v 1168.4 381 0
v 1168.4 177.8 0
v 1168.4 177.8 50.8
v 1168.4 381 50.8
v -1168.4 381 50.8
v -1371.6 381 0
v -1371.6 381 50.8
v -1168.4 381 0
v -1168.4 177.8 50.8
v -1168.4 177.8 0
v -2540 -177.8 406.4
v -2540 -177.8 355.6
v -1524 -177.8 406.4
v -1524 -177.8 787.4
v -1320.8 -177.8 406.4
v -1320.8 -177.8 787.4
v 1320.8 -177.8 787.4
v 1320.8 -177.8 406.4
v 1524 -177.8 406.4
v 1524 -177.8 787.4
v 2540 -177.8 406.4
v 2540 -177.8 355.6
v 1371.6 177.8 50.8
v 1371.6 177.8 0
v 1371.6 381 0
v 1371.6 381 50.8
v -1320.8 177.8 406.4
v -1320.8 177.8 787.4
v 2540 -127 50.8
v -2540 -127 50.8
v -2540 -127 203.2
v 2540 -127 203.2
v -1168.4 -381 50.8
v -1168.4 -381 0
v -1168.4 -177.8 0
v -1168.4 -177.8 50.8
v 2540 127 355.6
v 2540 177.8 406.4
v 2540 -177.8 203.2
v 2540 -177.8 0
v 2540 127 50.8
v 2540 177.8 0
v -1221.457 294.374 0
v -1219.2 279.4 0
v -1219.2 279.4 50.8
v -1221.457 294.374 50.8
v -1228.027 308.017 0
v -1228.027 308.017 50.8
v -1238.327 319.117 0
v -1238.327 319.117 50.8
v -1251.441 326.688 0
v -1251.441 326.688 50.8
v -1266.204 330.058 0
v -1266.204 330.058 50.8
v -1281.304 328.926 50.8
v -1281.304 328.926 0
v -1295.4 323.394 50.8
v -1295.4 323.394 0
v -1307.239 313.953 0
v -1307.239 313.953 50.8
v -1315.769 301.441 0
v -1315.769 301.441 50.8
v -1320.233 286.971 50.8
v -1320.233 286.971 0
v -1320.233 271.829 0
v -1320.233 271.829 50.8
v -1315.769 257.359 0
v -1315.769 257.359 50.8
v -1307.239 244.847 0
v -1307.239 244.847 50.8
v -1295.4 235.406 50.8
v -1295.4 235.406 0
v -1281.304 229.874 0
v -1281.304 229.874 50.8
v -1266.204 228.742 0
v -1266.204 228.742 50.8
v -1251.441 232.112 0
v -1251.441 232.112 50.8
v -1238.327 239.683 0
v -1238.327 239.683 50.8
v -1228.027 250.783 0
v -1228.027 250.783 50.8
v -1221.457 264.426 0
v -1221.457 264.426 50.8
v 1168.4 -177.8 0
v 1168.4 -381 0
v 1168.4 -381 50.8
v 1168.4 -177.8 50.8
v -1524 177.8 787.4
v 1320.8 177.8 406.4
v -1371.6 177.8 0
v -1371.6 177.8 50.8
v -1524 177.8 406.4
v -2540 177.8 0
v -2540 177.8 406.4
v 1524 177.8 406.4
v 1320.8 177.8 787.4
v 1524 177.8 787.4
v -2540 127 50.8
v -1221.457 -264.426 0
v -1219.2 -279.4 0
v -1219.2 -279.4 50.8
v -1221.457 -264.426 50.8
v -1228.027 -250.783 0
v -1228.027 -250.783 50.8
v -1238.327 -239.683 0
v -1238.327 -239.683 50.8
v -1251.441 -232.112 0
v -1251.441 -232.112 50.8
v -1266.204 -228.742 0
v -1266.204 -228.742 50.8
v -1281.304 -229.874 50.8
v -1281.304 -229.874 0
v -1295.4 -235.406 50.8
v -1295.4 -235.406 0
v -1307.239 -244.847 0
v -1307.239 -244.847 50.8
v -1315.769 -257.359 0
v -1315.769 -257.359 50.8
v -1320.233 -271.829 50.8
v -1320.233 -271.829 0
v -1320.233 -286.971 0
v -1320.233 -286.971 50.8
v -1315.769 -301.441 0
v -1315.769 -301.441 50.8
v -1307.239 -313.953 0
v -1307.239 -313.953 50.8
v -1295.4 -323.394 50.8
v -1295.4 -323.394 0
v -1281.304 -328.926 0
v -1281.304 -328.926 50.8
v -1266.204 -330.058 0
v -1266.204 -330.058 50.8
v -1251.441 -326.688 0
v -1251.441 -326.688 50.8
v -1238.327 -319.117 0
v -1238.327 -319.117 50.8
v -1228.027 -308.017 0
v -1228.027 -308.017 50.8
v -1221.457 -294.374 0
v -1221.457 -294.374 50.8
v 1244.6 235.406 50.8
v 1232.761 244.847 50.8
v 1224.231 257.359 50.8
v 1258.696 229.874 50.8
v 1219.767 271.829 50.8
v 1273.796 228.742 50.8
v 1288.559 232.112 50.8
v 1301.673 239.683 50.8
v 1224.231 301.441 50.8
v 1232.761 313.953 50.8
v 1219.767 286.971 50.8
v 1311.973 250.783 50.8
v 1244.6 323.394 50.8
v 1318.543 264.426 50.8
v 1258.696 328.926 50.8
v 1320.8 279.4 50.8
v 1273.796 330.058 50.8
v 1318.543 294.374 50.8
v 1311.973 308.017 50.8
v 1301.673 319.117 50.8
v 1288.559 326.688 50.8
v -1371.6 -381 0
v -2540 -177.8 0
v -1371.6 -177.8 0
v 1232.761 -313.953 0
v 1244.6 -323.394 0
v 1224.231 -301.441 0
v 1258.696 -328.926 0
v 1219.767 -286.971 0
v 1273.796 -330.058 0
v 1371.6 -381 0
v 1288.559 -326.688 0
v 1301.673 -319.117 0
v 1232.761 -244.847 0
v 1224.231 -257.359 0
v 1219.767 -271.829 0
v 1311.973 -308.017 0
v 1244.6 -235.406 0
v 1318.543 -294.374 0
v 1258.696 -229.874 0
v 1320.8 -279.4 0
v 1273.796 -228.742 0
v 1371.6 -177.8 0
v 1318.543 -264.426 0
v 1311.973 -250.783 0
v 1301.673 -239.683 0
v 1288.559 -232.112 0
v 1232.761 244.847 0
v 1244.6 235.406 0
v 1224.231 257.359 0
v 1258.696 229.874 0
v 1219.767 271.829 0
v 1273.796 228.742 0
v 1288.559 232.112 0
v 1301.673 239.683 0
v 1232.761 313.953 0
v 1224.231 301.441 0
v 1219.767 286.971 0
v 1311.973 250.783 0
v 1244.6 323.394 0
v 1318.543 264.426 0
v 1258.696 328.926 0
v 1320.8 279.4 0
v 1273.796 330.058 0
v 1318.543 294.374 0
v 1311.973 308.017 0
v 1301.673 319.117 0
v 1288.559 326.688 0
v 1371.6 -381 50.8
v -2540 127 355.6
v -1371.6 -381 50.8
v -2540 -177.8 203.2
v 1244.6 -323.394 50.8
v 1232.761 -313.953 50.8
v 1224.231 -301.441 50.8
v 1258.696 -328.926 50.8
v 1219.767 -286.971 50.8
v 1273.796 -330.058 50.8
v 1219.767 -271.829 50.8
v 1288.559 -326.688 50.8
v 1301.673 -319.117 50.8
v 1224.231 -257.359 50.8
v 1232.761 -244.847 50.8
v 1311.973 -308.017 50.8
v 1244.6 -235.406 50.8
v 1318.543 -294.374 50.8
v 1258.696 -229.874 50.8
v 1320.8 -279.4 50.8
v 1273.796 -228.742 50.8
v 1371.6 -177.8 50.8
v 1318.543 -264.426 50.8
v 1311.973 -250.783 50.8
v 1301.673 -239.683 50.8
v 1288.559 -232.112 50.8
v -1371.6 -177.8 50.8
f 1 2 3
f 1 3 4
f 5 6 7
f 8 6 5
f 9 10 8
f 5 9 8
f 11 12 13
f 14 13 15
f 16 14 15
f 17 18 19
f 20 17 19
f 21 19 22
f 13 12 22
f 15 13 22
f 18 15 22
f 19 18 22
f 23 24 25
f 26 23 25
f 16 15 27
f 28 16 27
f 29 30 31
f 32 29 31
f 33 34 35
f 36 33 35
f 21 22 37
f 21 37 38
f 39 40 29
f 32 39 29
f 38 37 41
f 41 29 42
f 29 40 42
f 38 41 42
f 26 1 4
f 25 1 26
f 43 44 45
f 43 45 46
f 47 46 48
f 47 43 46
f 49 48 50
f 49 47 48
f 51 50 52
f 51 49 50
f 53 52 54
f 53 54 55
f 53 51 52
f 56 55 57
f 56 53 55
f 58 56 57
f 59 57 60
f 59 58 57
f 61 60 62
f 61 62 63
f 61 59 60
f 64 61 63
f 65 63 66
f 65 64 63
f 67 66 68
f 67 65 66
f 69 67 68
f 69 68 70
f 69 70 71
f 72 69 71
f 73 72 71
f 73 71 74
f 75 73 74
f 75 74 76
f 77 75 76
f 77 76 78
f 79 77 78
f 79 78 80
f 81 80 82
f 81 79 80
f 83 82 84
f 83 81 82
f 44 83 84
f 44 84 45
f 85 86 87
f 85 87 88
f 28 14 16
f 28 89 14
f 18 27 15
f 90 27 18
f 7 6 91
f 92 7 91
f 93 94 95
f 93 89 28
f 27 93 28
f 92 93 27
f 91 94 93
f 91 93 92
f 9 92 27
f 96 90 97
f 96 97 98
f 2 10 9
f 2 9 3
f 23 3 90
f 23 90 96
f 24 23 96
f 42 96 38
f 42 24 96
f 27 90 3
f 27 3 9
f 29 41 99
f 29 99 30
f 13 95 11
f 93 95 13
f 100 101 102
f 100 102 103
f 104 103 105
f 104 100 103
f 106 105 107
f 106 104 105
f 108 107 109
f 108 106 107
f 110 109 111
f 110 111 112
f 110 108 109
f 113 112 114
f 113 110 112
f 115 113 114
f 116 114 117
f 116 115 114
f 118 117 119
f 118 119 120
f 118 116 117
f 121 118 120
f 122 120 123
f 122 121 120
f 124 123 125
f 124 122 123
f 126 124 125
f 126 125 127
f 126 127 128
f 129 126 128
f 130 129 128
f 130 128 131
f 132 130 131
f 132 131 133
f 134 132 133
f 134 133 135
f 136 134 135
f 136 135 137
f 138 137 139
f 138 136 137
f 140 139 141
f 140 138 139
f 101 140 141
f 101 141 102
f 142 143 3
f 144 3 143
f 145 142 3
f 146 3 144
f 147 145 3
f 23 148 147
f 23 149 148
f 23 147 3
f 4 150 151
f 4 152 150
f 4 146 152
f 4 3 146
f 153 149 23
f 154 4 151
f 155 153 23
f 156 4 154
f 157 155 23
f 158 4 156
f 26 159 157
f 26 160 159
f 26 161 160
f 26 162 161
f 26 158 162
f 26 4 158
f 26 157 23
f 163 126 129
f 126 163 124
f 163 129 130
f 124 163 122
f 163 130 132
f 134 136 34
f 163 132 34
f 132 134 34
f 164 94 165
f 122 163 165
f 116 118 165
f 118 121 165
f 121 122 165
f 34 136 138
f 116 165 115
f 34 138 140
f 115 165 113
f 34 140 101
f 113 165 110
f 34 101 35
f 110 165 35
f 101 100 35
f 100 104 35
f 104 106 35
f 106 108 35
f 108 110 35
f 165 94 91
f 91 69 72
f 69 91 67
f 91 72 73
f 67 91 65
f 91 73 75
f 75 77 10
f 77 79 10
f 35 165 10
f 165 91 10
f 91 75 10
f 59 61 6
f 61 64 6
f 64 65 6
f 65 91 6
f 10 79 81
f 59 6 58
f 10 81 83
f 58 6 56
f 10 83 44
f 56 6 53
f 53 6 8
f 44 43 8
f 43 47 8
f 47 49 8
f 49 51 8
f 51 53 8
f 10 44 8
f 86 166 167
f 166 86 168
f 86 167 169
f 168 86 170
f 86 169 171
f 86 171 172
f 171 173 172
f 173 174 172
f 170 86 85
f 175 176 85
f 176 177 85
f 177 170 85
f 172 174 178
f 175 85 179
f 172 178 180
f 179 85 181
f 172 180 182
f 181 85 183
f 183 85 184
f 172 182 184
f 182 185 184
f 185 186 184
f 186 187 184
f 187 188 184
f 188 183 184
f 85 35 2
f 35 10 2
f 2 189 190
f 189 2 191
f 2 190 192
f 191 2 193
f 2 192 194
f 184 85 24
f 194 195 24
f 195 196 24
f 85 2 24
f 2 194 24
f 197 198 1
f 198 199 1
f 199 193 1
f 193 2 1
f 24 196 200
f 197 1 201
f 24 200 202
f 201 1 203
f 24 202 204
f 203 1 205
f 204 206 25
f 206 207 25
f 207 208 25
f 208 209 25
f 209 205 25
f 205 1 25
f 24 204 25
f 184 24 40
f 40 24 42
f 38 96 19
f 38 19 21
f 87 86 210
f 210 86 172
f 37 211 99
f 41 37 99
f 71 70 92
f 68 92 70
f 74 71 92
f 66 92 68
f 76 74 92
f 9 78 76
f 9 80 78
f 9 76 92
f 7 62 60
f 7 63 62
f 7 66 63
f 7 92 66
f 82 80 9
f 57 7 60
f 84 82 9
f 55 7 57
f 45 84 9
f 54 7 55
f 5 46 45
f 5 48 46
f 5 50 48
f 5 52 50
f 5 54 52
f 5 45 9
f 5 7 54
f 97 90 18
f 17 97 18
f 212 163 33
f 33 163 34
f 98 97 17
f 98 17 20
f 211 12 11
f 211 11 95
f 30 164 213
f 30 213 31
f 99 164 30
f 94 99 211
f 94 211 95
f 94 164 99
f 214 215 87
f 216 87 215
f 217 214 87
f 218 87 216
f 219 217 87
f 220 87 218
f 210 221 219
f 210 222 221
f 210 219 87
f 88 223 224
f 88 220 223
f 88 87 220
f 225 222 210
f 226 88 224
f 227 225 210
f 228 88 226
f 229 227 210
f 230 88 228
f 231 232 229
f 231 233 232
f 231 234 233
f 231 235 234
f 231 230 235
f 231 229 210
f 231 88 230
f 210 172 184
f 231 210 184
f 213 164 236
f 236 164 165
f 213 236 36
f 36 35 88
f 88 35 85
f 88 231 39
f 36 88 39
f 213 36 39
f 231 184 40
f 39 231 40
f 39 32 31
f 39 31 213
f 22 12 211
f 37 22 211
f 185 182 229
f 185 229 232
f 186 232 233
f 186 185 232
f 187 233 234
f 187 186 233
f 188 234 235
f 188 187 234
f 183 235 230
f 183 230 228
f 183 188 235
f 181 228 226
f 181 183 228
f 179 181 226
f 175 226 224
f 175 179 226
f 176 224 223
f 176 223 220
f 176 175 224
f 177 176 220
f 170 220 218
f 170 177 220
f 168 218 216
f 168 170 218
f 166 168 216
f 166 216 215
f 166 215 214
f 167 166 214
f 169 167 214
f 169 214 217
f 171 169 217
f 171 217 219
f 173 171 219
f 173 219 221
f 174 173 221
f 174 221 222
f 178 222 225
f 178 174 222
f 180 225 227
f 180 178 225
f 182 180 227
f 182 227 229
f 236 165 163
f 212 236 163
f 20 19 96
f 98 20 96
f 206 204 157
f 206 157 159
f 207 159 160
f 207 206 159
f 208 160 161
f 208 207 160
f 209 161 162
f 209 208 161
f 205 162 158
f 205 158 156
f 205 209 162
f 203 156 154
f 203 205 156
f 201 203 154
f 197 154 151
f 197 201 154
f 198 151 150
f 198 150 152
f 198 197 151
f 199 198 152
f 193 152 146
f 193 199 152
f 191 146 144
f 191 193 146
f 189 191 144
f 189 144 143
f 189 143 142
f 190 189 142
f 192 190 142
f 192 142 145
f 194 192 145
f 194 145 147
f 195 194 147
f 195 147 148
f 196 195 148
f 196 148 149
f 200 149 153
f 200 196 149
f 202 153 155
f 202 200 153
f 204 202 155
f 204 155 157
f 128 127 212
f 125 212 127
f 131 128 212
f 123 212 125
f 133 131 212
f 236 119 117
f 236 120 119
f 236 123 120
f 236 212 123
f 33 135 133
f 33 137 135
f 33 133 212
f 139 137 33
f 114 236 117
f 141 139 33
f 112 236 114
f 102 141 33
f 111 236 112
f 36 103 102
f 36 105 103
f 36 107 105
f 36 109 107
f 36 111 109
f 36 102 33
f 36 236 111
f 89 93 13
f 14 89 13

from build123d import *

# Parameters (mm, degrees)
F0_W     = 203.2
F0_H     = 203.2
F0_R     = 50.8
F0_H_2   = 355.6
F0_W_2   = 2336.8
F0_W_3   = 1168.4
F1_DEPTH = 50.8
F2_DEPTH = 406.4
F3_W     = 50.8
F3_H     = 152.4
F4_DEPTH = 5963.92
F5_W     = 203.2
F5_H     = 177.8
F6_DEPTH = 381


with BuildPart() as f1:
    # F0 (on Top) → F1 (new body)
    with BuildSketch(Plane.XY):
        with Locations((-1270, 279.4)):
            Rectangle(F0_W, F0_H)
        with Locations((-1270, 279.4)):
            Circle(F0_R, mode=Mode.SUBTRACT)
        with Locations((-1270, -279.4)):
            Rectangle(F0_W, F0_H)
        with Locations((-1270, -279.4)):
            Circle(F0_R, mode=Mode.SUBTRACT)
        with Locations((-1270, 0)):
            Rectangle(F0_W, F0_H_2)
        Rectangle(F0_W_2, F0_H_2)
        with Locations((-1955.8, 0)):
            Rectangle(F0_W_3, F0_H_2)
        with Locations((1955.8, 0)):
            Rectangle(F0_W_3, F0_H_2)
        with Locations((1270, 0)):
            Rectangle(F0_W, F0_H_2)
        with Locations((1270, 279.4)):
            Rectangle(F0_W, F0_H)
        with Locations((1270, 279.4)):
            Circle(F0_R, mode=Mode.SUBTRACT)
        with Locations((1270, -279.4)):
            Rectangle(F0_W, F0_H)
        with Locations((1270, -279.4)):
            Circle(F0_R, mode=Mode.SUBTRACT)
    extrude(amount=F1_DEPTH)

    # F0 (on Top) → F2 (join)
    with BuildSketch(Plane.XY):
        Rectangle(F0_W_2, F0_H_2)
        with Locations((1955.8, 0)):
            Rectangle(F0_W_3, F0_H_2)
        with Locations((-1955.8, 0)):
            Rectangle(F0_W_3, F0_H_2)
        with Locations((-1270, 0)):
            Rectangle(F0_W, F0_H_2)
        with Locations((1270, 0)):
            Rectangle(F0_W, F0_H_2)
    extrude(amount=F2_DEPTH)

    # F3 (on face) → F4 (cut)
    with BuildSketch(Plane(origin=(-2540, 0, 0), x_dir=(0, -1, 0), z_dir=(-1, 0, 0))):
        Polygon((-127, 355.6), (-127, 50.8), (127, 50.8), (127, 203.2), (127, 355.6), align=None)
        with Locations((203.2, 279.4)):
            Rectangle(F3_W, F3_H)
        with Locations((152.4, 279.4)):
            Rectangle(F3_W, F3_H)
    extrude(amount=-F4_DEPTH, mode=Mode.SUBTRACT)

    # F5 (on face) → F6 (join)
    with BuildSketch(Plane.XY.offset(406.4)):
        with Locations((1422.4, 88.9)):
            Rectangle(F5_W, F5_H)
        with Locations((1422.4, -88.9)):
            Rectangle(F5_W, F5_H)
        with Locations((-1422.4, -88.9)):
            Rectangle(F5_W, F5_H)
        with Locations((-1422.4, 88.9)):
            Rectangle(F5_W, F5_H)
    extrude(amount=F6_DEPTH)


solid = f1.part
